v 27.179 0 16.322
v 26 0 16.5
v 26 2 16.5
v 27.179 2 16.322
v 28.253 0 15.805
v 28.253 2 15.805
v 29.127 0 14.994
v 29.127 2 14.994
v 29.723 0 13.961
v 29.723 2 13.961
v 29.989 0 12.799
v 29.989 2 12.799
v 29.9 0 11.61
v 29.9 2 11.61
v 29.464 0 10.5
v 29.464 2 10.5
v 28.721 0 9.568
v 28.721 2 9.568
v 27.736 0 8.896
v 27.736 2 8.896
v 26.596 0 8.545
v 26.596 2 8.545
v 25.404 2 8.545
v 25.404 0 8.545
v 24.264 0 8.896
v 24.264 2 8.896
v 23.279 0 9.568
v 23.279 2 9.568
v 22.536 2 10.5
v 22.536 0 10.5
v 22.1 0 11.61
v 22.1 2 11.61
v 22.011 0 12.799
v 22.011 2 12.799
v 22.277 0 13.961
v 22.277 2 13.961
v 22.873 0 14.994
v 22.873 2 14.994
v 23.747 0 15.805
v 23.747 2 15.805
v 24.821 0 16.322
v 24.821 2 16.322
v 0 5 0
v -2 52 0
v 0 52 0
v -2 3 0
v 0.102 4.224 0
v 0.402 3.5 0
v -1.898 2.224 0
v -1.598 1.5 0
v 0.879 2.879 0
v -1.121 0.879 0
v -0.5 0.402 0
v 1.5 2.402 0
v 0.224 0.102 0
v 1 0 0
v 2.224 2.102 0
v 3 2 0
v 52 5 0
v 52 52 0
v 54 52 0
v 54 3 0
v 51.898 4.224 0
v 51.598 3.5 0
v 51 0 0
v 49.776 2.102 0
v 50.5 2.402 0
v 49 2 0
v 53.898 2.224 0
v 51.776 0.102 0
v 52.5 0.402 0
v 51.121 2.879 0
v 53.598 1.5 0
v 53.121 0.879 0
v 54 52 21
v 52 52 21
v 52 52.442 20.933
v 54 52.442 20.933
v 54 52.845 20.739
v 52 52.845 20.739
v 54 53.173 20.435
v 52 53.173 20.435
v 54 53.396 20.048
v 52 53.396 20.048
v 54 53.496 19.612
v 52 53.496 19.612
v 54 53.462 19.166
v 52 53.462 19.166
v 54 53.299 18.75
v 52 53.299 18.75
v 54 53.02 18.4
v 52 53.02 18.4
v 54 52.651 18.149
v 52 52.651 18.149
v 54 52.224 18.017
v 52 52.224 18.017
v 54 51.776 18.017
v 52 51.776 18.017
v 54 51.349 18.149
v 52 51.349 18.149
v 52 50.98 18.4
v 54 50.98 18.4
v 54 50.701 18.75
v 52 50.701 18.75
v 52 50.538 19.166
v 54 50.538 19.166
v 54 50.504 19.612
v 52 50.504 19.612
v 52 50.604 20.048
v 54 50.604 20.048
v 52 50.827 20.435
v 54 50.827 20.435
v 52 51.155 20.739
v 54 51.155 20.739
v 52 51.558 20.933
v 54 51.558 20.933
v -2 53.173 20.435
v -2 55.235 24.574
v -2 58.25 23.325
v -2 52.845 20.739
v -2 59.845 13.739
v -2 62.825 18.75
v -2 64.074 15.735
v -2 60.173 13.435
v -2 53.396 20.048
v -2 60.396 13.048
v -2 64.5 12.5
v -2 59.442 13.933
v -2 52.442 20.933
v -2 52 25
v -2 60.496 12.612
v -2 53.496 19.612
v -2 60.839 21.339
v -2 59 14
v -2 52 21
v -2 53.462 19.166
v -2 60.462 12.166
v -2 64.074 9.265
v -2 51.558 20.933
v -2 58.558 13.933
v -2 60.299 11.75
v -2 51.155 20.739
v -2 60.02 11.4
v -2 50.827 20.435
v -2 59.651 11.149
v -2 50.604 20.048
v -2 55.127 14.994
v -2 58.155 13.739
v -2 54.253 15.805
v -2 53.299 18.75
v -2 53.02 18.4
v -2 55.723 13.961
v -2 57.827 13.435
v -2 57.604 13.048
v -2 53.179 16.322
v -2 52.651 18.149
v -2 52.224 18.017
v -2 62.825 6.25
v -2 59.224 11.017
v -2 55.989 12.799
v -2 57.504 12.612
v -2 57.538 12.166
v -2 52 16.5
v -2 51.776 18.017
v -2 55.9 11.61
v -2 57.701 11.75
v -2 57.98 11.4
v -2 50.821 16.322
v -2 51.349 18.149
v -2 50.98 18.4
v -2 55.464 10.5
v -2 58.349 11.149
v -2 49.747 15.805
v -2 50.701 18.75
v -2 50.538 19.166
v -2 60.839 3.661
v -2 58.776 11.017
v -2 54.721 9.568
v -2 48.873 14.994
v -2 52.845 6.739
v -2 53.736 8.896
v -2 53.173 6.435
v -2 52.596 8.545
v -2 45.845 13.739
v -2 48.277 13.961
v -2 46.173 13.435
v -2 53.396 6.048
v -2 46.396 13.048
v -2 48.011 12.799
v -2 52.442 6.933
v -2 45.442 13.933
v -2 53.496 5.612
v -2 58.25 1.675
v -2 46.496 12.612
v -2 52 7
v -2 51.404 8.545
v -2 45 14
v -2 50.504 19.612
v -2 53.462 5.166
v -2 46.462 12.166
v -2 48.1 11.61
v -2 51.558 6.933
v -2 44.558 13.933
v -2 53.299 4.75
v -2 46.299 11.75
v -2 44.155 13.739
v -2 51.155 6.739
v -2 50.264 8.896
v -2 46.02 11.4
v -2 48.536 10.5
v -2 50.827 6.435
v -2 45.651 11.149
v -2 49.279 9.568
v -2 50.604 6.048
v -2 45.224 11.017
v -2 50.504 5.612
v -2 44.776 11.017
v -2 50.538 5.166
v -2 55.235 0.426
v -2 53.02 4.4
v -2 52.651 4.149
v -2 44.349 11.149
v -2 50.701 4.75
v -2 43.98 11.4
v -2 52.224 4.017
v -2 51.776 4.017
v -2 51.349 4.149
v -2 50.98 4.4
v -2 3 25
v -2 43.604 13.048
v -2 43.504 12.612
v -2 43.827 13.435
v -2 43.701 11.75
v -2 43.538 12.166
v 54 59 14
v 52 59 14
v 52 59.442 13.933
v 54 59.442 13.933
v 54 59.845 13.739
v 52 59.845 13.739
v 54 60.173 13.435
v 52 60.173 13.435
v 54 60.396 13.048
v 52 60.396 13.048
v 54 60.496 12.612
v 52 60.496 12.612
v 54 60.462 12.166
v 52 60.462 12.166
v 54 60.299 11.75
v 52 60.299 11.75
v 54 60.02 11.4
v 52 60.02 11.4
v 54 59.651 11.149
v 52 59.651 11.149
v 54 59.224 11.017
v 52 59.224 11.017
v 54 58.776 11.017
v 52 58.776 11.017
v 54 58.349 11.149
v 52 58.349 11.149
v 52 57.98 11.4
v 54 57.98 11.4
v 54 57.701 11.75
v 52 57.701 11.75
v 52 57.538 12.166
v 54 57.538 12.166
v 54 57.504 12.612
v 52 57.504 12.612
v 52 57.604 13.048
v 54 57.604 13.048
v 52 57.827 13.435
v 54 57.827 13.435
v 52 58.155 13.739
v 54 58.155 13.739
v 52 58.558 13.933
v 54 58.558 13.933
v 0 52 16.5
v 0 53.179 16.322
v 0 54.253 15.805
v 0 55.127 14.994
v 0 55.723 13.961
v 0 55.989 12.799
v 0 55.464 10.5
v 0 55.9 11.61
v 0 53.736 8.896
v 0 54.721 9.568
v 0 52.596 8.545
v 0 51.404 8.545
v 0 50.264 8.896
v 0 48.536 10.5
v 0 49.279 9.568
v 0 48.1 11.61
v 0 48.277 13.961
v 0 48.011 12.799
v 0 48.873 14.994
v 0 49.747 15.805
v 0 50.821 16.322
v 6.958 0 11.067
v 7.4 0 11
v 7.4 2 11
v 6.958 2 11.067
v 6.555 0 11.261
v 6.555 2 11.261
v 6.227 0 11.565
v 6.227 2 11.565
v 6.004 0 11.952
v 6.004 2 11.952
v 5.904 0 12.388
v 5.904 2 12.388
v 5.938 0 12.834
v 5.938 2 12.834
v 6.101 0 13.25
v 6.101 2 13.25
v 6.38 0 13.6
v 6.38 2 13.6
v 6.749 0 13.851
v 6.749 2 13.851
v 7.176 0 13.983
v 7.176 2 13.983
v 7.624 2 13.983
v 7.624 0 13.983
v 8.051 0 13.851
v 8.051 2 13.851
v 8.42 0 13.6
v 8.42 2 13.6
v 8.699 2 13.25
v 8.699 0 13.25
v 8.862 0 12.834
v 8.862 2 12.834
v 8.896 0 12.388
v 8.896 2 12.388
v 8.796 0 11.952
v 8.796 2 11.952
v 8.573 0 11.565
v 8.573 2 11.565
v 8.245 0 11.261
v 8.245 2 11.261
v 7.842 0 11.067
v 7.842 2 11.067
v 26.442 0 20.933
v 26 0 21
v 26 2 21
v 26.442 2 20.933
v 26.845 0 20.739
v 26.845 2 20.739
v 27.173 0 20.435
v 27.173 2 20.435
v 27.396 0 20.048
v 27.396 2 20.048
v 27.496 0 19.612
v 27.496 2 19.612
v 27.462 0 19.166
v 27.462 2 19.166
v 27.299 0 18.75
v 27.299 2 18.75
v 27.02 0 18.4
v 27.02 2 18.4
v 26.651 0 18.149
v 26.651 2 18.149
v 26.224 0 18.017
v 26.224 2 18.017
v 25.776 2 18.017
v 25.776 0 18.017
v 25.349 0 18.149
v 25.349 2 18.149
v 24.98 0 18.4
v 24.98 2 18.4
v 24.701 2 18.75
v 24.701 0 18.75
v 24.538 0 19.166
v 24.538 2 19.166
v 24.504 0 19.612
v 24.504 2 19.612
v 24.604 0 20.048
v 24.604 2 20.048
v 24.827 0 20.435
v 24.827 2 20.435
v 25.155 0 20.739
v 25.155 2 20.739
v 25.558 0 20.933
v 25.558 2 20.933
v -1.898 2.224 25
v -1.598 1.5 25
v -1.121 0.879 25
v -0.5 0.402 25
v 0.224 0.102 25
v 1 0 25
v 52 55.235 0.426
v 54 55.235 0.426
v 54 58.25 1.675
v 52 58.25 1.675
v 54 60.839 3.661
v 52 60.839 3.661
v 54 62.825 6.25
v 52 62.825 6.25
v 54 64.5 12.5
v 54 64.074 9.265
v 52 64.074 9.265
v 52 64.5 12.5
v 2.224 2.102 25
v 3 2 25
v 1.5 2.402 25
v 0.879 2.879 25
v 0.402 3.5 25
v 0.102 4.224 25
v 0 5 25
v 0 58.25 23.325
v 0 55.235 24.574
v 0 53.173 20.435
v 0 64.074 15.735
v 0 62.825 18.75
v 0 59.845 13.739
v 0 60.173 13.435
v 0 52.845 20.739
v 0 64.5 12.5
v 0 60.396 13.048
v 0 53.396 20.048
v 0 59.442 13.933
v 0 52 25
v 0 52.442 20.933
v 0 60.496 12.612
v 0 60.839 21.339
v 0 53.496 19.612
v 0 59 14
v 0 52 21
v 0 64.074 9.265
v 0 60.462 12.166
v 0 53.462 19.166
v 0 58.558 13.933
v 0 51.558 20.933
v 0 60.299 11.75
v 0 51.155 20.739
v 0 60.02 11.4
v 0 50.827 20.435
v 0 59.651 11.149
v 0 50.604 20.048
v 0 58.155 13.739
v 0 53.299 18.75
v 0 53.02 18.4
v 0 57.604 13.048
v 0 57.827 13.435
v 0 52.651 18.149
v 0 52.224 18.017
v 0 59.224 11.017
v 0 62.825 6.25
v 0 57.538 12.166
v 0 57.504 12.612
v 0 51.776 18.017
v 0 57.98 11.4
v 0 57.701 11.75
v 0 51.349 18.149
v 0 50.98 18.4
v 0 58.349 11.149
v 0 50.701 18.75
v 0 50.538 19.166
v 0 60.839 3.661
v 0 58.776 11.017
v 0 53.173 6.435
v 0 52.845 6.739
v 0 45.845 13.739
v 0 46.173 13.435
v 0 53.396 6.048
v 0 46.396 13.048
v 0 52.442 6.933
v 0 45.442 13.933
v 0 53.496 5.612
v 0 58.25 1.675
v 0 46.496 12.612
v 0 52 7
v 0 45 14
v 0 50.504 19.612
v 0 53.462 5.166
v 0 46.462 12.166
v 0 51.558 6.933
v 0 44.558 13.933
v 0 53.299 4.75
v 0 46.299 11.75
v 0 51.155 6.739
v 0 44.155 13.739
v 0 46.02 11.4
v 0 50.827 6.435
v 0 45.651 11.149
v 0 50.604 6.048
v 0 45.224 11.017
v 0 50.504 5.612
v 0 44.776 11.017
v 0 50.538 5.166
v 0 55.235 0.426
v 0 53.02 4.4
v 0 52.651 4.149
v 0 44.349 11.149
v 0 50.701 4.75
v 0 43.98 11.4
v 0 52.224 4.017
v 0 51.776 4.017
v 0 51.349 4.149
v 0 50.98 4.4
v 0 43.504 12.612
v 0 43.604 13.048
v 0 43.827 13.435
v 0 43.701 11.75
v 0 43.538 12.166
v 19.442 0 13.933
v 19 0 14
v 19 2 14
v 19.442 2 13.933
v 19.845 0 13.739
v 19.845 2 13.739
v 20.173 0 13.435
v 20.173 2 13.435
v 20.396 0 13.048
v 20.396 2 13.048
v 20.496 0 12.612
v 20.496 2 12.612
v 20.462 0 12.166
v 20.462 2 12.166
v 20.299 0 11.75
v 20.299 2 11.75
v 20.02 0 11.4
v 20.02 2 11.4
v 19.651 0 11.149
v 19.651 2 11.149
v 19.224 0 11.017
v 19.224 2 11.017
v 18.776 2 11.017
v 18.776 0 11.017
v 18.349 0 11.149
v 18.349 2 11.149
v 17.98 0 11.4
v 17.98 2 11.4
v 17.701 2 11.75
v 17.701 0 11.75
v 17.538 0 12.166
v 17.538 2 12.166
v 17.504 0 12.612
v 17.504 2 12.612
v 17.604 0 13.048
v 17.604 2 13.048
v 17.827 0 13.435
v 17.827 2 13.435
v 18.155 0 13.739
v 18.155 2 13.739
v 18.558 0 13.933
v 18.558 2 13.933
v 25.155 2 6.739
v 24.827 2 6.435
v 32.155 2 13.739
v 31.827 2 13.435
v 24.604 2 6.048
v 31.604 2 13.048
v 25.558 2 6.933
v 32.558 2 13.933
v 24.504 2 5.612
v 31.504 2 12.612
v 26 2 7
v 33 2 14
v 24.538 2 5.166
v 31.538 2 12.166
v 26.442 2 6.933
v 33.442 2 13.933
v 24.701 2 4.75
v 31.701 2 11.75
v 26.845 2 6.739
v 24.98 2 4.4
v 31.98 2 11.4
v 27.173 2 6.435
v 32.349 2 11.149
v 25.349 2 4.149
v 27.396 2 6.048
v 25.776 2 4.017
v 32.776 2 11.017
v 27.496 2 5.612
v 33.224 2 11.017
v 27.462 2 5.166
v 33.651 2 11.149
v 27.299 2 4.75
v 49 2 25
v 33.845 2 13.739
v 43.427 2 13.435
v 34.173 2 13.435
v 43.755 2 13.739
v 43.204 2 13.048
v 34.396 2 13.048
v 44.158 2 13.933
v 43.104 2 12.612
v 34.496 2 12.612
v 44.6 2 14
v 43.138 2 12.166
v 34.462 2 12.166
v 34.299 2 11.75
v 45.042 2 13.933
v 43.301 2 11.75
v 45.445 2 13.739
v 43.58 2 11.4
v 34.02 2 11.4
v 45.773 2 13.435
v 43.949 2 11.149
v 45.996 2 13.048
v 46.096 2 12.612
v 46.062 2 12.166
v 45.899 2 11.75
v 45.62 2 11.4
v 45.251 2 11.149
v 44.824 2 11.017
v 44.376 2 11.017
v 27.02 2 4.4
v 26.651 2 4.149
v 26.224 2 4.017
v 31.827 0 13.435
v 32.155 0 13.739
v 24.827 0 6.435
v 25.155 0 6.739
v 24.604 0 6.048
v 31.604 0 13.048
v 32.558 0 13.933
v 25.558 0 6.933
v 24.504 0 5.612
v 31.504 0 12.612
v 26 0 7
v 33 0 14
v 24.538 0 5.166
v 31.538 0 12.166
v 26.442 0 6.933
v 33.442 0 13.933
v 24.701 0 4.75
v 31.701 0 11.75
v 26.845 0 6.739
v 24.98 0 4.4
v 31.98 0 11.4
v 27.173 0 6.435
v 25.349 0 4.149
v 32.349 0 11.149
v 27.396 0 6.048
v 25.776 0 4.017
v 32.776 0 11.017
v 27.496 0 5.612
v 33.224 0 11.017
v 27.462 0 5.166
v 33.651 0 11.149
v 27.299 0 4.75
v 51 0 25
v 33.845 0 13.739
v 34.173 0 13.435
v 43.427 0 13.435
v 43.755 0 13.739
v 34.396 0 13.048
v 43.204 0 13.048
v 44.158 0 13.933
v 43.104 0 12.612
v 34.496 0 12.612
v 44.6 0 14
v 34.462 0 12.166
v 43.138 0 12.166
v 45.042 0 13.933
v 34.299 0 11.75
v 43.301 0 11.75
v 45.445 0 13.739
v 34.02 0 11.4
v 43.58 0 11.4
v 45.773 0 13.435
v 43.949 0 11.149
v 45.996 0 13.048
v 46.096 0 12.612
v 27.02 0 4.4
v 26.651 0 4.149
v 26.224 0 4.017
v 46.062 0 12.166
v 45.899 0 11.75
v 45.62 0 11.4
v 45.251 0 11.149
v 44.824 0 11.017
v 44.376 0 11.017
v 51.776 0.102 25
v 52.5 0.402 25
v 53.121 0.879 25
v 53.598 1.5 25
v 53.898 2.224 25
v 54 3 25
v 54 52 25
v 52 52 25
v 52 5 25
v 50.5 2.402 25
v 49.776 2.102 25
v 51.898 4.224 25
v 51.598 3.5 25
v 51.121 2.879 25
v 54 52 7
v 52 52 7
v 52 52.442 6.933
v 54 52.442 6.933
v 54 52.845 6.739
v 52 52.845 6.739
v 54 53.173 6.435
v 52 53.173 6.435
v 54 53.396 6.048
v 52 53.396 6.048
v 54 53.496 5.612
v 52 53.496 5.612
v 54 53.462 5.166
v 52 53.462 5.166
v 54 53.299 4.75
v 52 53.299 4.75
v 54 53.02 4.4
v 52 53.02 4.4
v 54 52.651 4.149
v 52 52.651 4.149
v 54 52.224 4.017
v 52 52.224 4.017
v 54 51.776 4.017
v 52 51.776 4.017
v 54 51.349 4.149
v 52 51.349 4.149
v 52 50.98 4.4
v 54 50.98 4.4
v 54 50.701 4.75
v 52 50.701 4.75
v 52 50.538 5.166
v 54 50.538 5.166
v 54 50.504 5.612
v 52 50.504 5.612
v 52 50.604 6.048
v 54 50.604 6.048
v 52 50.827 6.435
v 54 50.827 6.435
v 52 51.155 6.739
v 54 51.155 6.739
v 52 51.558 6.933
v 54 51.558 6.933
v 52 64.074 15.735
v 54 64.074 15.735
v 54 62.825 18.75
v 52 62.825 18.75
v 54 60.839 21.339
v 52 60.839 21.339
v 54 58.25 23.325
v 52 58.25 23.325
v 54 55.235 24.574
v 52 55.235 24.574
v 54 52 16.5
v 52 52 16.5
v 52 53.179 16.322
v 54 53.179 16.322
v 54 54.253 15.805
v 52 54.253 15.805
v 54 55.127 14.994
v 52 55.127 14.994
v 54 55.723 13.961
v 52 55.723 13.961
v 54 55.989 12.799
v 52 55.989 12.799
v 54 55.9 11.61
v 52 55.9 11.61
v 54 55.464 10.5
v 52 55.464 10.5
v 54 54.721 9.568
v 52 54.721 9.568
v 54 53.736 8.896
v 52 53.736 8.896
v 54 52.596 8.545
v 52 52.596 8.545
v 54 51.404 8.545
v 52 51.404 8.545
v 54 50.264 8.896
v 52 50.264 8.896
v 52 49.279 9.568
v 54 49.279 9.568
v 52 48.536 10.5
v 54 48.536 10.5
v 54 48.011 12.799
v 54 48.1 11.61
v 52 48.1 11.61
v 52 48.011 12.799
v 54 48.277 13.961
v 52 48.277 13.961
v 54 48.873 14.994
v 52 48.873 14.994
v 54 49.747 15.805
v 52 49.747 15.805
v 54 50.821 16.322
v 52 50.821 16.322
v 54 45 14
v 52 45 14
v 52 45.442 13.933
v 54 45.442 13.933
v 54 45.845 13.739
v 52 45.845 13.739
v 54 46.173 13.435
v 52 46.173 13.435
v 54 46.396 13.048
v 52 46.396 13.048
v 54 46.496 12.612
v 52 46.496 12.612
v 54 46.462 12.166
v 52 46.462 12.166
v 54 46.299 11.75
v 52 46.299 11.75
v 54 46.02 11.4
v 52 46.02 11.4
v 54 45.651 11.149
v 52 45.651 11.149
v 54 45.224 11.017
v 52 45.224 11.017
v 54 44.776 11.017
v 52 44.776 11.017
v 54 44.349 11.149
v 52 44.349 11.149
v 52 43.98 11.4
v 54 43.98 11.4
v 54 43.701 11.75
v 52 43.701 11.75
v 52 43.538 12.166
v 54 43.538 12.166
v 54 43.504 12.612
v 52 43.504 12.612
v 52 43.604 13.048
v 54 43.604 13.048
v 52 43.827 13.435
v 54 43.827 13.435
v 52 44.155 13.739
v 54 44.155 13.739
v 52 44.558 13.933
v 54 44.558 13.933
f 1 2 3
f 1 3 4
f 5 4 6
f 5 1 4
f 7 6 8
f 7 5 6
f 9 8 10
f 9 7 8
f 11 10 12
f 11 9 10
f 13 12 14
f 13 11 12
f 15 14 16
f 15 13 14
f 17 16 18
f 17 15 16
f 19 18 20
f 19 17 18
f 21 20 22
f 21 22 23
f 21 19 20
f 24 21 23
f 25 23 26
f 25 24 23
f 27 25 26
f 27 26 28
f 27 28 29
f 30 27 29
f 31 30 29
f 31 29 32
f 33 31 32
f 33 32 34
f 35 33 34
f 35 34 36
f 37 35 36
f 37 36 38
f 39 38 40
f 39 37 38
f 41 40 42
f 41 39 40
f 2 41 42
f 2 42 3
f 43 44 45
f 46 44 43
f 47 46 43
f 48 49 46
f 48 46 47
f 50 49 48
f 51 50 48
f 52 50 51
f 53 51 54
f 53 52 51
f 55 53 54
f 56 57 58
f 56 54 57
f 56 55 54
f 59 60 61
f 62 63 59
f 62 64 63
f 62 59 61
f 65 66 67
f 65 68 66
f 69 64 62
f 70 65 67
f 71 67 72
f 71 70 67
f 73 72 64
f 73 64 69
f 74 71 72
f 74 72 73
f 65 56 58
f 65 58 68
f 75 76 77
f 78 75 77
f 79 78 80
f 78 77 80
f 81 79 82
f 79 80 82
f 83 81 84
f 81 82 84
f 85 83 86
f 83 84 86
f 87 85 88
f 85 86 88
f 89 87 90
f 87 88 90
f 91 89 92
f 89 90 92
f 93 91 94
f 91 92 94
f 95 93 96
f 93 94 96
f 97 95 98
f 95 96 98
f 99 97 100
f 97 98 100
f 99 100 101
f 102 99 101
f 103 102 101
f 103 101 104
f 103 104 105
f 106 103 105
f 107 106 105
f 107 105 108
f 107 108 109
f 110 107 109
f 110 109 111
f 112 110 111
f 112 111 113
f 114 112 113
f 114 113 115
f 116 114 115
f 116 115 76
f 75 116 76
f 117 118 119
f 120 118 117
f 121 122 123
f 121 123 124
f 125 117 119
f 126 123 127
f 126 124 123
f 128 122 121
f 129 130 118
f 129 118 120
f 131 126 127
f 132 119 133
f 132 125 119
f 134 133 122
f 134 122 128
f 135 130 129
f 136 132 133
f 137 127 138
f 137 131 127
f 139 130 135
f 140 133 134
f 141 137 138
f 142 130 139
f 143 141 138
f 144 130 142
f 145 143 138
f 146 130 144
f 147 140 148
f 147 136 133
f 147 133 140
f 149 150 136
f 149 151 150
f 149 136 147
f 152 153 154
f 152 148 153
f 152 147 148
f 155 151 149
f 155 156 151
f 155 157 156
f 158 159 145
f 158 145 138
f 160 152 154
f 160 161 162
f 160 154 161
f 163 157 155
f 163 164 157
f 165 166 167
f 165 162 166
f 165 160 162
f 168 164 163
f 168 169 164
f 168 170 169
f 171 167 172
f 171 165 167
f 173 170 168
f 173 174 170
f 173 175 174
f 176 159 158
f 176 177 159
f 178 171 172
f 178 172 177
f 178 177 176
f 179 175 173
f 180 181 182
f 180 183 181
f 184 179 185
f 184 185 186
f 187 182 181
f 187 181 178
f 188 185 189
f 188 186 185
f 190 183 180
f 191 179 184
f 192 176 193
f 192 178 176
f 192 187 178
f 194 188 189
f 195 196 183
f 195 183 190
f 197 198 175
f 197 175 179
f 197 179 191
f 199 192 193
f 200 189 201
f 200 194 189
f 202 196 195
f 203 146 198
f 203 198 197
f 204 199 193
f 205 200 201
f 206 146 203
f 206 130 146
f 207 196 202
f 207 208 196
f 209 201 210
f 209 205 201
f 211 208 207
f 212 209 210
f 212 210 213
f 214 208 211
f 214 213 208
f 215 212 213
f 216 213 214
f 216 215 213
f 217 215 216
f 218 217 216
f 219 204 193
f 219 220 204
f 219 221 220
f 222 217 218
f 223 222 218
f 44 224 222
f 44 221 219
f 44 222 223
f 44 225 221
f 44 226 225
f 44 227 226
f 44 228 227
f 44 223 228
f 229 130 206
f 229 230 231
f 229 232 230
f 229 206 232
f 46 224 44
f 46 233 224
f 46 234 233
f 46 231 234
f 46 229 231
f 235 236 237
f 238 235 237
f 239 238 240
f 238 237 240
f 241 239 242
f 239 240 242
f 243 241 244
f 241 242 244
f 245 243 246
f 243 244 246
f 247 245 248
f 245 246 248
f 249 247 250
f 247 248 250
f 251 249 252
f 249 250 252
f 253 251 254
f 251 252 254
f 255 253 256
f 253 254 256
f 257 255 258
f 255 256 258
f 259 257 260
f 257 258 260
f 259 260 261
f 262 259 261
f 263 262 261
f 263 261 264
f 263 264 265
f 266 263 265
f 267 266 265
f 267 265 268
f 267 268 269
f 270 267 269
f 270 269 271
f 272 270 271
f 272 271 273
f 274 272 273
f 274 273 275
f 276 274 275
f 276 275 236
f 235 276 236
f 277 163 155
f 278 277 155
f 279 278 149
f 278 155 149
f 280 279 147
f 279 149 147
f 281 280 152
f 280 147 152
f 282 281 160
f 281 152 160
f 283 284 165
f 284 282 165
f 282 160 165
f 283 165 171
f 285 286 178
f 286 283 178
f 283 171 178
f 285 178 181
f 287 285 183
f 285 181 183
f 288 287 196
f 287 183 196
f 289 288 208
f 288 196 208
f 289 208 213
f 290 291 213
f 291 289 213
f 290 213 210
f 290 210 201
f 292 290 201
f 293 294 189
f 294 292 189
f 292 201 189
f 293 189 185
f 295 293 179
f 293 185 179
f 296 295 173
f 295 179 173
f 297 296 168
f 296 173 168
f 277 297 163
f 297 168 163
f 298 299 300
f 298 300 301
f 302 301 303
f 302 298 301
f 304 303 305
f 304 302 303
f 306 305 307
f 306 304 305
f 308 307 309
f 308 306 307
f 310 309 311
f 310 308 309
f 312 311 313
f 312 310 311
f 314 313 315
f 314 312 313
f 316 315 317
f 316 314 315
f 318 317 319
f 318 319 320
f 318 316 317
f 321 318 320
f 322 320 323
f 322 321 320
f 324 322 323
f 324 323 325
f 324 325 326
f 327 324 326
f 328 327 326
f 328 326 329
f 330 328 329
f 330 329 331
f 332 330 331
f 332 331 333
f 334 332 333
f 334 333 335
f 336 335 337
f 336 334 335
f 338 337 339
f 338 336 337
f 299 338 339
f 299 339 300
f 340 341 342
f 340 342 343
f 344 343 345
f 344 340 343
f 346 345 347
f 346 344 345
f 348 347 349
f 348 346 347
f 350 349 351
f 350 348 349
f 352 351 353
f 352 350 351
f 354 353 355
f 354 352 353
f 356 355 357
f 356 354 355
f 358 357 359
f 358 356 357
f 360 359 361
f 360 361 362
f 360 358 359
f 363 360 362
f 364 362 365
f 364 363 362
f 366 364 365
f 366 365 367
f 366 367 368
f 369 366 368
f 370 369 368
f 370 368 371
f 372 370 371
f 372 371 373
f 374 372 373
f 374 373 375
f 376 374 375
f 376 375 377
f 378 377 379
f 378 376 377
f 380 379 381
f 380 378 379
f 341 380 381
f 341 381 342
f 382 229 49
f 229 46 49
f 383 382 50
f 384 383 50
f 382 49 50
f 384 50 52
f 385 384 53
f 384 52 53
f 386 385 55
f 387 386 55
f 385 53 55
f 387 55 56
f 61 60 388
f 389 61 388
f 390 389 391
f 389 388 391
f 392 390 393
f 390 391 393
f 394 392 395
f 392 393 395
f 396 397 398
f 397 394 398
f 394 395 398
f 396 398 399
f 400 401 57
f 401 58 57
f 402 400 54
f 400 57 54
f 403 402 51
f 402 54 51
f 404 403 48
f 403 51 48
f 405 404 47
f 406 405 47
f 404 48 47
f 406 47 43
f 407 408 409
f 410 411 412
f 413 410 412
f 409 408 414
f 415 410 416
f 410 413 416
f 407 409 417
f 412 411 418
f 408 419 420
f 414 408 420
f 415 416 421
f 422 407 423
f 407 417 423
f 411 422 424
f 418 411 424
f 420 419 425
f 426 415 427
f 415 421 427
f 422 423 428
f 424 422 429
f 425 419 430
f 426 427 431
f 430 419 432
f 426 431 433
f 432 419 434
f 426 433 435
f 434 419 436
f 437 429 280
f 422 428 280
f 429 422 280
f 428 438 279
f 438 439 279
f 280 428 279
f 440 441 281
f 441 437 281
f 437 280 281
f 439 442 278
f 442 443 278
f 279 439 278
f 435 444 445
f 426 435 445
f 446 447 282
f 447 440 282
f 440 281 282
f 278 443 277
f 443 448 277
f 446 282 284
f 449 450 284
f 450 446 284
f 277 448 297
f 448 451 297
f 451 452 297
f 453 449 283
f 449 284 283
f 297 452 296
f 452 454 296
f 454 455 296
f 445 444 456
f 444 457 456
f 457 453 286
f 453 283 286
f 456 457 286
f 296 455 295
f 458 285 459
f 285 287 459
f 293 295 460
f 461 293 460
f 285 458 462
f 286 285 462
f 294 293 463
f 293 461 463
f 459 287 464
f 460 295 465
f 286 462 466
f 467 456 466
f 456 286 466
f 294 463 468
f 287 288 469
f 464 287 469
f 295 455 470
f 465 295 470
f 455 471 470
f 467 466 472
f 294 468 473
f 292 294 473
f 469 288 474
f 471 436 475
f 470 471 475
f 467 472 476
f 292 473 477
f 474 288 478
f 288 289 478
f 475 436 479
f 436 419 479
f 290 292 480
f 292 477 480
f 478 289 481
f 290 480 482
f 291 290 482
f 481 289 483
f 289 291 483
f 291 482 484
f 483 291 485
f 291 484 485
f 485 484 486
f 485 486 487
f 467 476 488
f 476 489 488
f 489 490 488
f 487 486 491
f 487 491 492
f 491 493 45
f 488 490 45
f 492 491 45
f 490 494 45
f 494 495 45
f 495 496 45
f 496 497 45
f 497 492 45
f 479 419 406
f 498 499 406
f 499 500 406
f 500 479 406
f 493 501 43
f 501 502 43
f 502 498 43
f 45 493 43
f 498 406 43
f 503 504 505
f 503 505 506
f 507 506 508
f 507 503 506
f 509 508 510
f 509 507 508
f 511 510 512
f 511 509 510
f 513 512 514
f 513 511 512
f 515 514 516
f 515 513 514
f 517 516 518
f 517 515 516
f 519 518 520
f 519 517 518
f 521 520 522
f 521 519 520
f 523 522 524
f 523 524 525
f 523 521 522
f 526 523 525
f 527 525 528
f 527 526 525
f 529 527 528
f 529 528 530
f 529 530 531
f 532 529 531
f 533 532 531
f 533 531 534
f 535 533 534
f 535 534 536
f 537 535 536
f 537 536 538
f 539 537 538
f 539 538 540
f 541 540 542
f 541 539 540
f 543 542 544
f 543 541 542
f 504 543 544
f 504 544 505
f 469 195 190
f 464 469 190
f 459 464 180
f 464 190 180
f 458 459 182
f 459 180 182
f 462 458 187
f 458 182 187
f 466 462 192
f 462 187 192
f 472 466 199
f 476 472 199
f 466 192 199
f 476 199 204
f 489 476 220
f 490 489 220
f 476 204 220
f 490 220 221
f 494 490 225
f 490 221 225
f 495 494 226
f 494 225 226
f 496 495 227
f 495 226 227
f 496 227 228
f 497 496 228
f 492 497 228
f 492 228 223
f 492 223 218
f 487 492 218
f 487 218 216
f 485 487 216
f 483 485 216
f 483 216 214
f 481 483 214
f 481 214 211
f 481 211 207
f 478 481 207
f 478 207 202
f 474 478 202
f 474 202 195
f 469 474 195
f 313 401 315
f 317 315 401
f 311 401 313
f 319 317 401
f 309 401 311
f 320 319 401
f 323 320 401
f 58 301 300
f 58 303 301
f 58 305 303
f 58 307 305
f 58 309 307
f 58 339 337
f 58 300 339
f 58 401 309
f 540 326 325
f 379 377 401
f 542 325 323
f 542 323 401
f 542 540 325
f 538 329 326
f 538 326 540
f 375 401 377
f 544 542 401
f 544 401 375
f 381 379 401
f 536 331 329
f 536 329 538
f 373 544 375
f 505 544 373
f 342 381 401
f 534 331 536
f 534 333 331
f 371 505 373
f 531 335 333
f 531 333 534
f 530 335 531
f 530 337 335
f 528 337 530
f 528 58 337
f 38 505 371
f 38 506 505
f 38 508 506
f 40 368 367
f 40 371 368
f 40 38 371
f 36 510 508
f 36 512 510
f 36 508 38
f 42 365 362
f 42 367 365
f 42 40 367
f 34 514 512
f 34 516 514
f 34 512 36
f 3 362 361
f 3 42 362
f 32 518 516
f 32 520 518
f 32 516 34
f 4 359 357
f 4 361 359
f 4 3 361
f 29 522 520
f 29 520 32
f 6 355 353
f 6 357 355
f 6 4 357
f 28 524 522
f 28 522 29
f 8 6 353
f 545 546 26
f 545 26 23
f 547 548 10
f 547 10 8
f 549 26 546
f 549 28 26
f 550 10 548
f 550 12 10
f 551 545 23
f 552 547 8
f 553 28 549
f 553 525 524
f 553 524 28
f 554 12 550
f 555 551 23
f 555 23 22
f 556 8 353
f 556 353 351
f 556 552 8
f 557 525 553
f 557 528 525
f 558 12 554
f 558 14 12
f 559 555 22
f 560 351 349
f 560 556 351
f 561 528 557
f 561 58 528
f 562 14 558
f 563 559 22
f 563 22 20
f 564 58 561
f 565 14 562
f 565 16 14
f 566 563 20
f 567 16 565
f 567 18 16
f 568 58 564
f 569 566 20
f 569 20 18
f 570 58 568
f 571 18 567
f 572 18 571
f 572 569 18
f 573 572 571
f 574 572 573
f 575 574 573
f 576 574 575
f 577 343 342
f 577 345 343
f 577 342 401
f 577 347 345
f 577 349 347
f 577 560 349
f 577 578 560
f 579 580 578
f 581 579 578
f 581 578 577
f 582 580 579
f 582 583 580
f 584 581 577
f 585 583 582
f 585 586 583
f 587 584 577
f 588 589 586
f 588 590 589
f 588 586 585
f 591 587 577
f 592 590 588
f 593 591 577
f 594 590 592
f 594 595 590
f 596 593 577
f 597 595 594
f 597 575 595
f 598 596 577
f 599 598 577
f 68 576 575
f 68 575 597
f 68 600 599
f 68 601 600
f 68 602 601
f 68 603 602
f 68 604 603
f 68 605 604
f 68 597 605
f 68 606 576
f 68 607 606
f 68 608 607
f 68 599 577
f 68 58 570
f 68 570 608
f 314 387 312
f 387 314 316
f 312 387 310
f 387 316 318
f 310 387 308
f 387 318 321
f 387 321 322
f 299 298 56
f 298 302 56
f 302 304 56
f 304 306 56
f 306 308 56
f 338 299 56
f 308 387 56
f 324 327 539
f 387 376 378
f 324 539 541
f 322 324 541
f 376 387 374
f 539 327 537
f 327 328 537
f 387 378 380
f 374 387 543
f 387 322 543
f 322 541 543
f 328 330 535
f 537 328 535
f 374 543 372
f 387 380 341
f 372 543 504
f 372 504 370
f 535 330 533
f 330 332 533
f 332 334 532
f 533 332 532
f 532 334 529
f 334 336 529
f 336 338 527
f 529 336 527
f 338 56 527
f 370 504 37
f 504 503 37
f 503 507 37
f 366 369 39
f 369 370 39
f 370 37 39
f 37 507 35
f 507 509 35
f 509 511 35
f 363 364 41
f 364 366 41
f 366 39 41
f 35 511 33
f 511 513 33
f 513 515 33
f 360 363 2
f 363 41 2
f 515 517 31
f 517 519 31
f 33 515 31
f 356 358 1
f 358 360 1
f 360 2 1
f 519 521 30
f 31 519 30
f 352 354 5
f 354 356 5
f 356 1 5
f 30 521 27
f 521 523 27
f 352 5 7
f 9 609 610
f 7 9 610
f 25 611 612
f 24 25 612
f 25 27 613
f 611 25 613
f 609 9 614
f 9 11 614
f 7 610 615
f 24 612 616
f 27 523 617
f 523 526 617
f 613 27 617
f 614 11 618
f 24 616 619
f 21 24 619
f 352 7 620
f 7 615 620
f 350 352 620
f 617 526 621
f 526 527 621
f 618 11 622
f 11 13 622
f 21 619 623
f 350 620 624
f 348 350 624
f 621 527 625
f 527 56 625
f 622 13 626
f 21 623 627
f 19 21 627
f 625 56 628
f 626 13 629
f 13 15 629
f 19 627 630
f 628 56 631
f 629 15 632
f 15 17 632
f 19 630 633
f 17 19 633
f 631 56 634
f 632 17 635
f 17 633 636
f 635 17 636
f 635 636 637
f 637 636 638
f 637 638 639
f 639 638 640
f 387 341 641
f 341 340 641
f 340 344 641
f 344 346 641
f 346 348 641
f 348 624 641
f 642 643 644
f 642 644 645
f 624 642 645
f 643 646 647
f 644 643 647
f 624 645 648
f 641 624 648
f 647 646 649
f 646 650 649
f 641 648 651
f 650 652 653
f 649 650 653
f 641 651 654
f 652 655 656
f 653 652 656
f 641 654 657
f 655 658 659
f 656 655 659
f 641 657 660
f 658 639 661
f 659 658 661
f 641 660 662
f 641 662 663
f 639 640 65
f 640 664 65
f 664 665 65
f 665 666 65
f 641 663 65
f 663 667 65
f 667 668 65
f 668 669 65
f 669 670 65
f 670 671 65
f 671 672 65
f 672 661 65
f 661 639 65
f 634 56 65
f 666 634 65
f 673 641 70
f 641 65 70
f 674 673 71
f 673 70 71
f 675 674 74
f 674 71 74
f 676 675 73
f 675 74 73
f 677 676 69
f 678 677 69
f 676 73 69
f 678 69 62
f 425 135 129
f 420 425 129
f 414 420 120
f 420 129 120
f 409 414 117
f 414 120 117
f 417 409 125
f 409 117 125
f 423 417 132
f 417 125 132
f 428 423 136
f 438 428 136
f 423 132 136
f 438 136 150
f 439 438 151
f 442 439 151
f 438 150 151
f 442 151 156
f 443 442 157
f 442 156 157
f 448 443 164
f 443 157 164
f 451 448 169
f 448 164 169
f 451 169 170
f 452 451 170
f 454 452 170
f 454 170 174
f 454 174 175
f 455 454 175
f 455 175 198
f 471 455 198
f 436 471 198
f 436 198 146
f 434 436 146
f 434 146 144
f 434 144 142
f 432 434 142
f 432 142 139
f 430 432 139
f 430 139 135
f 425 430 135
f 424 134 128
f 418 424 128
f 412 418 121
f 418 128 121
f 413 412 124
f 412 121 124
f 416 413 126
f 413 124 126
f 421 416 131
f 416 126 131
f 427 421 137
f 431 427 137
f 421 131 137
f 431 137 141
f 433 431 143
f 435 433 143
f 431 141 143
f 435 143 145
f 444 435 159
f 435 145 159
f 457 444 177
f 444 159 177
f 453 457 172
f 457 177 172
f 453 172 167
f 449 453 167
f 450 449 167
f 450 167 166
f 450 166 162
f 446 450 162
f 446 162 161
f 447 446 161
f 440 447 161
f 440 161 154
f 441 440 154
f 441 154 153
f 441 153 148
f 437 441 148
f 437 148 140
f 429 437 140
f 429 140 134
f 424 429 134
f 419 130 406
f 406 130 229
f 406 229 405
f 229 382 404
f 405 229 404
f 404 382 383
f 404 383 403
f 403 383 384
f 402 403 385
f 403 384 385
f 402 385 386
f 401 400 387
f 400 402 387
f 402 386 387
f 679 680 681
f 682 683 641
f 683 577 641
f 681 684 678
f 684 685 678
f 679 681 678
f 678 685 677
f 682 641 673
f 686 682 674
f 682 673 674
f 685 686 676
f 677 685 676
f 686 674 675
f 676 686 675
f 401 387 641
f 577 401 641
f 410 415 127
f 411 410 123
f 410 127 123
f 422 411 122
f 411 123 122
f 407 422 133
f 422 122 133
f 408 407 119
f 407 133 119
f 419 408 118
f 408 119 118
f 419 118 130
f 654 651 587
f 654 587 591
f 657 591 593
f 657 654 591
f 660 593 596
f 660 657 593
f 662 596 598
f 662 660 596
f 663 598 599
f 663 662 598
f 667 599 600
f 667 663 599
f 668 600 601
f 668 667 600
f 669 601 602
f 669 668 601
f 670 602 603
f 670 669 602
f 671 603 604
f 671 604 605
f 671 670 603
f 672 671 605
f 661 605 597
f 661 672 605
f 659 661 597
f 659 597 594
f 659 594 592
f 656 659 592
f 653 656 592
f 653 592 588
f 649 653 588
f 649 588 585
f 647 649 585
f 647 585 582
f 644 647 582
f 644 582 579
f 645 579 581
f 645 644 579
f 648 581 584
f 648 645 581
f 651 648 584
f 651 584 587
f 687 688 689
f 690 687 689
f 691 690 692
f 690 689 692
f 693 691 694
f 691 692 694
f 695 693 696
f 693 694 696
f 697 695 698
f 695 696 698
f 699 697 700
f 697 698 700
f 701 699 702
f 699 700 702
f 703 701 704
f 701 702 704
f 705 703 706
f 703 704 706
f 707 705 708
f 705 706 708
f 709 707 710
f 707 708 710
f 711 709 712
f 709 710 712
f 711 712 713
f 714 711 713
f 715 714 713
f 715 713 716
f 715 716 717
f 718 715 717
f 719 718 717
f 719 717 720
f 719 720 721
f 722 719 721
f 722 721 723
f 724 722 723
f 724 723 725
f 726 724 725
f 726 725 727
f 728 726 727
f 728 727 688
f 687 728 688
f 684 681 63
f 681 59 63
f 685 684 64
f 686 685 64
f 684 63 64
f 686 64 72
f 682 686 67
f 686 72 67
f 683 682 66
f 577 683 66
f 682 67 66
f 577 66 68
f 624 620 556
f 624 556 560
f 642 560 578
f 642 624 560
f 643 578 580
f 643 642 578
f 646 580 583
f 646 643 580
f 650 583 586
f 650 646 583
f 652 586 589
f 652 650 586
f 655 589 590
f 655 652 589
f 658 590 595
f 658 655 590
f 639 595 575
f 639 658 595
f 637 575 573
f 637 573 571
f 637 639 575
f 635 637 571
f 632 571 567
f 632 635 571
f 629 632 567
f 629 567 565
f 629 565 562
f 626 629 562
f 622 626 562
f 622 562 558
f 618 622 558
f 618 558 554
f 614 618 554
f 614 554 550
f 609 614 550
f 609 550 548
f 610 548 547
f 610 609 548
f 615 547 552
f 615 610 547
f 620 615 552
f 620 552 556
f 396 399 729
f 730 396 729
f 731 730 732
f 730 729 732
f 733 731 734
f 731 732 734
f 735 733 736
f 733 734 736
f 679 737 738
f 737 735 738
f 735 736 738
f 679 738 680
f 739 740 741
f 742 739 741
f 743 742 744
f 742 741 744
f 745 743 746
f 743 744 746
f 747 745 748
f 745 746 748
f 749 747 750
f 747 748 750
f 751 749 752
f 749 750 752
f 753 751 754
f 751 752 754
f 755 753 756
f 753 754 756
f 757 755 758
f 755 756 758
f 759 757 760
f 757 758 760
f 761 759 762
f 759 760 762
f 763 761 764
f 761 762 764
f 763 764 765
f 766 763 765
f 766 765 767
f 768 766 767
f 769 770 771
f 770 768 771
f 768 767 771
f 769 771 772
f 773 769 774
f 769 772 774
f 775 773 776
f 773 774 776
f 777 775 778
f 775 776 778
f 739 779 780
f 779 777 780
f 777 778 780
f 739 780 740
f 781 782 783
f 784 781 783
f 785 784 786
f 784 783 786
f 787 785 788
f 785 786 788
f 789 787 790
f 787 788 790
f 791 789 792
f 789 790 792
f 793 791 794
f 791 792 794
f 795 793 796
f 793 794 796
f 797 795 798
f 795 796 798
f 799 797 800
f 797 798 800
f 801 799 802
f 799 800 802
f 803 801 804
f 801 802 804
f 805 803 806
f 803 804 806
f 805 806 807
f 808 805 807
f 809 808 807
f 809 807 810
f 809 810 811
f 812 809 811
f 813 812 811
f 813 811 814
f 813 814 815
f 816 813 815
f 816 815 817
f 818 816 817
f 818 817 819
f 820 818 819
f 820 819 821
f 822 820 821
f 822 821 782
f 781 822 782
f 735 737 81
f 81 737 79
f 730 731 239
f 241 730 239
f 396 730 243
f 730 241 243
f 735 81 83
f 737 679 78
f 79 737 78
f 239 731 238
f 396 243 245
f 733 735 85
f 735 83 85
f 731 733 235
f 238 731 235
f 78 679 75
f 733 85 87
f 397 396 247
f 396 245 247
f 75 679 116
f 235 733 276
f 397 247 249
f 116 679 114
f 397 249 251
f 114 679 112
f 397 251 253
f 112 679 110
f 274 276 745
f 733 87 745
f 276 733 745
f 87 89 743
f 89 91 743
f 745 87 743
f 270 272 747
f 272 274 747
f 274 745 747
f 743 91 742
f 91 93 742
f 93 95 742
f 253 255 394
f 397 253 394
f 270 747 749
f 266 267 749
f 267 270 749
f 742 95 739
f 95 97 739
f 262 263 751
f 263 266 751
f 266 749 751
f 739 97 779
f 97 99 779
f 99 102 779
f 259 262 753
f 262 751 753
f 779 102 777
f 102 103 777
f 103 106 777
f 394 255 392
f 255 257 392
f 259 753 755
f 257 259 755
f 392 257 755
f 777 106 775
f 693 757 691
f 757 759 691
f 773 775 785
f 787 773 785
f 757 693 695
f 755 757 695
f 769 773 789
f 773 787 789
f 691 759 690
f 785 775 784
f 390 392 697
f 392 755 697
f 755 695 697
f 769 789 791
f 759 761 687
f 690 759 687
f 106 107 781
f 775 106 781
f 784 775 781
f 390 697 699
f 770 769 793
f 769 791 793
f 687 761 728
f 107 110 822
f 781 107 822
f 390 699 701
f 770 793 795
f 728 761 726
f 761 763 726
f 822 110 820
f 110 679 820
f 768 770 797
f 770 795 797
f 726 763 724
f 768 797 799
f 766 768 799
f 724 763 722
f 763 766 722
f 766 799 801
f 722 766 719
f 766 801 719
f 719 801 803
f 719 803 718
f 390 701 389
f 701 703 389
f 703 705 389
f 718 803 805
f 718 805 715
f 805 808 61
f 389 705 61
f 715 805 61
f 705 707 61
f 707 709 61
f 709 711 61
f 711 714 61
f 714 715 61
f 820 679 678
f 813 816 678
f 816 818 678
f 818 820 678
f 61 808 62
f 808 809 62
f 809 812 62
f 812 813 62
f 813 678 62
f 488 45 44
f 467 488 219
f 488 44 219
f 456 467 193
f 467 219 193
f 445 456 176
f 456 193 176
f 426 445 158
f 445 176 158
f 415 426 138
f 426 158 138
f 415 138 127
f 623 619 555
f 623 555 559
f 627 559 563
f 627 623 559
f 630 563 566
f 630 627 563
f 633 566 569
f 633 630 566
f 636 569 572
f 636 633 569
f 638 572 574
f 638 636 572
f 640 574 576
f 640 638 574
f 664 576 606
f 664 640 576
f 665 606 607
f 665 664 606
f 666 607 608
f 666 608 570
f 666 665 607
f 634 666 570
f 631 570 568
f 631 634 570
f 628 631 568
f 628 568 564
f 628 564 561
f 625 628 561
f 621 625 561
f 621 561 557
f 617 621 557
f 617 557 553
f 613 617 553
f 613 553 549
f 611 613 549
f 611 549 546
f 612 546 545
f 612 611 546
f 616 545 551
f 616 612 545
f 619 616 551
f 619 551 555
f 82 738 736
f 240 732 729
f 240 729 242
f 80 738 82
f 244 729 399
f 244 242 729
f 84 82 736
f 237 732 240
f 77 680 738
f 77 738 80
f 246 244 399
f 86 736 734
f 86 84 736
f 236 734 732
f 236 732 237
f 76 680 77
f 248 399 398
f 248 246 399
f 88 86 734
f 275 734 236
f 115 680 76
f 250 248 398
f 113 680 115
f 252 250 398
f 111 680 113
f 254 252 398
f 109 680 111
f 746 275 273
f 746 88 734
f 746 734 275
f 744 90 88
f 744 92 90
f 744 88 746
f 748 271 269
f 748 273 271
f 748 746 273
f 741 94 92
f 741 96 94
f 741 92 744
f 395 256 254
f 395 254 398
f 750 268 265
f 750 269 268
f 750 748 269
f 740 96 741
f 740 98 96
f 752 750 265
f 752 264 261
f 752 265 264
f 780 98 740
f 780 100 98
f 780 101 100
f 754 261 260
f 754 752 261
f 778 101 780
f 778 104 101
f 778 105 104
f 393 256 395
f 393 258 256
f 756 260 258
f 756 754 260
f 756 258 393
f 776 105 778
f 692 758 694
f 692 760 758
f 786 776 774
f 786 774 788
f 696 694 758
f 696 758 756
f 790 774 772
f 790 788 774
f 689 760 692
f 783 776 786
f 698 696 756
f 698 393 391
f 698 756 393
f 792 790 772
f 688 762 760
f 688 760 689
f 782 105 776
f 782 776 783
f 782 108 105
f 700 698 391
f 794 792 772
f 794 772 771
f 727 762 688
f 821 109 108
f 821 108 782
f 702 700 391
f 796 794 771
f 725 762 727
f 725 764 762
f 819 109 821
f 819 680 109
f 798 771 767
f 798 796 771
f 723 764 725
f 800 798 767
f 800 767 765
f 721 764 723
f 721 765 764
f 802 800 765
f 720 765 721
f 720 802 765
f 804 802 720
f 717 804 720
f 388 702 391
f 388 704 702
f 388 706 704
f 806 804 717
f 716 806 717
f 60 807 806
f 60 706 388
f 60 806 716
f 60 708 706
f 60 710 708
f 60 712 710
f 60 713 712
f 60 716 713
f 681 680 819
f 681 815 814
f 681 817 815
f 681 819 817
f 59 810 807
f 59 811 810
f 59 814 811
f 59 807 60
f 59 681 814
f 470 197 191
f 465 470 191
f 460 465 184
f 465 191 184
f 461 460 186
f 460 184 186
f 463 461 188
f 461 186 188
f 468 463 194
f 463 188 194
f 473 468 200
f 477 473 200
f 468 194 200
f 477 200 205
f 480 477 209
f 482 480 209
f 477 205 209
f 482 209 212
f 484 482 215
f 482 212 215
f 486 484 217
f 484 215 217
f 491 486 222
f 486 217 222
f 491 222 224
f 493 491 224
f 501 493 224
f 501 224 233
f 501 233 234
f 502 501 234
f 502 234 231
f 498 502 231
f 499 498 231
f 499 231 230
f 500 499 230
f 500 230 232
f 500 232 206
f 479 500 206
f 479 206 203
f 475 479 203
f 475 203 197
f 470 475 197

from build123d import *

# Parameters (mm, degrees)
SKETCH_1_W          = 52
SKETCH_1_H          = 25
SKETCH_1_R          = 1.5
SKETCH_1_R_2        = 4
EXTRUDE_1_DEPTH     = 2
SKETCH_2_W          = 2
SKETCH_2_H          = 25
EXTRUDE_2_DEPTH     = 64.5
CUT_EXTRUDE_2_REACH = 91.001
SKETCH_3_R          = 1.5
FILLET_1_R          = 3


with BuildPart() as part:
    # 草图1 → 凸台-拉伸1 (new body)
    with BuildSketch(Plane(origin=(0, 0, 0), x_dir=(1, 0, 0), z_dir=(0, 1, 0))):
        with Locations((26, -12.5)):
            Rectangle(SKETCH_1_W, SKETCH_1_H)
        with Locations(Location((44.6, -12.5, 0), (0, 0, 270))):
            Circle(SKETCH_1_R, mode=Mode.SUBTRACT)
        with Locations(Location((26, -12.5, 0), (0, 0, 270))):
            Circle(SKETCH_1_R_2, mode=Mode.SUBTRACT)
        with Locations(Location((26, -19.5, 0), (0, 0, 270))):
            Circle(SKETCH_1_R, mode=Mode.SUBTRACT)
        with Locations(Location((19, -12.5, 0), (0, 0, 270))):
            Circle(SKETCH_1_R, mode=Mode.SUBTRACT)
        with Locations(Location((26, -5.5, 0), (0, 0, 270))):
            Circle(SKETCH_1_R, mode=Mode.SUBTRACT)
        with Locations(Location((33, -12.5, 0), (0, 0, 270))):
            Circle(SKETCH_1_R, mode=Mode.SUBTRACT)
        with Locations(Location((7.4, -12.5, 0), (0, 0, 90))):
            Circle(SKETCH_1_R, mode=Mode.SUBTRACT)
    extrude(amount=EXTRUDE_1_DEPTH)

    # 草图2 → 凸台-拉伸2 (add)
    with BuildSketch(Plane(origin=(0, 0, 0), x_dir=(1, 0, 0), z_dir=(0, 1, 0))):
        with Locations((-1, -12.5)):
            Rectangle(SKETCH_2_W, SKETCH_2_H)
        with Locations((53, -12.5)):
            Rectangle(SKETCH_2_W, SKETCH_2_H)
    extrude(amount=EXTRUDE_2_DEPTH)

    # 切除-拉伸2: up to this face of the body (flat: up to its plane)
    cut_extrude_2_end = Plane(part.part.faces().sort_by_distance((54, 32.25, 12.5))[0])
    # 草图3 → 切除-拉伸2 (cut, up to the picked face)
    with BuildSketch(Plane.ZY.offset(2), mode=Mode.PRIVATE) as cut_extrude_2_sk1:
        with BuildLine():
            Line((0, 64.5), (0, 52))
            ThreePointArc((0, 52), (3.661165235, 60.838834765), (12.5, 64.5))
            Line((12.5, 64.5), (0, 64.5))
        make_face()
    cut_extrude_2_tool1 = split(extrude(cut_extrude_2_sk1.sketch, amount=-CUT_EXTRUDE_2_REACH, mode=Mode.PRIVATE), bisect_by=cut_extrude_2_end, keep=Keep.BOTH, mode=Mode.PRIVATE)
    # 草图3 → 切除-拉伸2 (cut, up to the picked face)
    with BuildSketch(Plane.ZY.offset(2), mode=Mode.PRIVATE) as cut_extrude_2_sk2:
        with BuildLine():
            Line((25, 64.5), (12.5, 64.5))
            ThreePointArc((12.5, 64.5), (21.338834765, 60.838834765), (25, 52))
            Line((25, 52), (25, 64.5))
        make_face()
    cut_extrude_2_tool2 = split(extrude(cut_extrude_2_sk2.sketch, amount=-CUT_EXTRUDE_2_REACH, mode=Mode.PRIVATE), bisect_by=cut_extrude_2_end, keep=Keep.BOTH, mode=Mode.PRIVATE)
    # 草图3 → 切除-拉伸2 (cut, up to the picked face)
    with BuildSketch(Plane.ZY.offset(2), mode=Mode.PRIVATE) as cut_extrude_2_sk3:
        with BuildLine():
            ThreePointArc((16.5, 52), (12.5, 56), (8.5, 52))
            Line((8.5, 52), (16.5, 52))
        make_face()
    cut_extrude_2_tool3 = split(extrude(cut_extrude_2_sk3.sketch, amount=-CUT_EXTRUDE_2_REACH, mode=Mode.PRIVATE), bisect_by=cut_extrude_2_end, keep=Keep.BOTH, mode=Mode.PRIVATE)
    # 草图3 → 切除-拉伸2 (cut, up to the picked face)
    with BuildSketch(Plane.ZY.offset(2), mode=Mode.PRIVATE) as cut_extrude_2_sk4:
        with BuildLine():
            Line((16.5, 52), (8.5, 52))
            ThreePointArc((8.5, 52), (12.5, 48), (16.5, 52))
        make_face()
    cut_extrude_2_tool4 = split(extrude(cut_extrude_2_sk4.sketch, amount=-CUT_EXTRUDE_2_REACH, mode=Mode.PRIVATE), bisect_by=cut_extrude_2_end, keep=Keep.BOTH, mode=Mode.PRIVATE)
    # 草图3 → 切除-拉伸2 (cut, up to the picked face)
    with BuildSketch(Plane.ZY.offset(2), mode=Mode.PRIVATE) as cut_extrude_2_sk5:
        with BuildLine():
            ThreePointArc((16.5, 52), (12.5, 56), (8.5, 52))
            Line((8.5, 52), (16.5, 52))
        make_face()
    cut_extrude_2_tool5 = split(extrude(cut_extrude_2_sk5.sketch, amount=-CUT_EXTRUDE_2_REACH, mode=Mode.PRIVATE), bisect_by=cut_extrude_2_end, keep=Keep.BOTH, mode=Mode.PRIVATE)
    # 草图3 → 切除-拉伸2 (cut, up to the picked face)
    with BuildSketch(Plane.ZY.offset(2), mode=Mode.PRIVATE) as cut_extrude_2_sk6:
        with BuildLine():
            Line((16.5, 52), (8.5, 52))
            ThreePointArc((8.5, 52), (12.5, 48), (16.5, 52))
        make_face()
    cut_extrude_2_tool6 = split(extrude(cut_extrude_2_sk6.sketch, amount=-CUT_EXTRUDE_2_REACH, mode=Mode.PRIVATE), bisect_by=cut_extrude_2_end, keep=Keep.BOTH, mode=Mode.PRIVATE)
    # 草图3 → 切除-拉伸2 (cut, up to the picked face)
    with BuildSketch(Plane.ZY.offset(2), mode=Mode.PRIVATE) as cut_extrude_2_sk7:
        with Locations((12.5, 45)):
            Circle(SKETCH_3_R)
    cut_extrude_2_tool7 = split(extrude(cut_extrude_2_sk7.sketch, amount=-CUT_EXTRUDE_2_REACH, mode=Mode.PRIVATE), bisect_by=cut_extrude_2_end, keep=Keep.BOTH, mode=Mode.PRIVATE)
    # 草图3 → 切除-拉伸2 (cut, up to the picked face)
    with BuildSketch(Plane.ZY.offset(2), mode=Mode.PRIVATE) as cut_extrude_2_sk8:
        with Locations((12.5, 59)):
            Circle(SKETCH_3_R)
    cut_extrude_2_tool8 = split(extrude(cut_extrude_2_sk8.sketch, amount=-CUT_EXTRUDE_2_REACH, mode=Mode.PRIVATE), bisect_by=cut_extrude_2_end, keep=Keep.BOTH, mode=Mode.PRIVATE)
    # 草图3 → 切除-拉伸2 (cut, up to the picked face)
    with BuildSketch(Plane.ZY.offset(2), mode=Mode.PRIVATE) as cut_extrude_2_sk9:
        with Locations((5.5, 52)):
            Circle(SKETCH_3_R)
    cut_extrude_2_tool9 = split(extrude(cut_extrude_2_sk9.sketch, amount=-CUT_EXTRUDE_2_REACH, mode=Mode.PRIVATE), bisect_by=cut_extrude_2_end, keep=Keep.BOTH, mode=Mode.PRIVATE)
    # 草图3 → 切除-拉伸2 (cut, up to the picked face)
    with BuildSketch(Plane.ZY.offset(2), mode=Mode.PRIVATE) as cut_extrude_2_sk10:
        with Locations((19.5, 52)):
            Circle(SKETCH_3_R)
    cut_extrude_2_tool10 = split(extrude(cut_extrude_2_sk10.sketch, amount=-CUT_EXTRUDE_2_REACH, mode=Mode.PRIVATE), bisect_by=cut_extrude_2_end, keep=Keep.BOTH, mode=Mode.PRIVATE)
    add(cut_extrude_2_tool1.solids().sort_by(Axis((-2, 61.707901, 2.792099), (1, 0, 0)))[0], mode=Mode.SUBTRACT)
    add(cut_extrude_2_tool2.solids().sort_by(Axis((-2, 61.707901, 22.207901), (1, 0, 0)))[0], mode=Mode.SUBTRACT)
    add(cut_extrude_2_tool3.solids().sort_by(Axis((-2, 53.697653, 12.5), (1, 0, 0)))[0], mode=Mode.SUBTRACT)
    add(cut_extrude_2_tool4.solids().sort_by(Axis((-2, 50.302347, 12.5), (1, 0, 0)))[0], mode=Mode.SUBTRACT)
    add(cut_extrude_2_tool5.solids().sort_by(Axis((-2, 53.697653, 12.5), (1, 0, 0)))[0], mode=Mode.SUBTRACT)
    add(cut_extrude_2_tool6.solids().sort_by(Axis((-2, 50.302347, 12.5), (1, 0, 0)))[0], mode=Mode.SUBTRACT)
    add(cut_extrude_2_tool7.solids().sort_by(Axis((-2, 45, 12.5), (1, 0, 0)))[0], mode=Mode.SUBTRACT)
    add(cut_extrude_2_tool8.solids().sort_by(Axis((-2, 59, 12.5), (1, 0, 0)))[0], mode=Mode.SUBTRACT)
    add(cut_extrude_2_tool9.solids().sort_by(Axis((-2, 52, 5.5), (1, 0, 0)))[0], mode=Mode.SUBTRACT)
    add(cut_extrude_2_tool10.solids().sort_by(Axis((-2, 52, 19.5), (1, 0, 0)))[0], mode=Mode.SUBTRACT)

    # 圆角1
    fillet_1_edges = [part.edges().sort_by_distance(p)[0] for p in [
        (52, 2, 12.5),
        (0, 2, 12.5),
        (-2, 0, 12.5),
        (54, 0, 12.5),
    ]]
    fillet(fillet_1_edges, radius=FILLET_1_R)


solid = part.part
